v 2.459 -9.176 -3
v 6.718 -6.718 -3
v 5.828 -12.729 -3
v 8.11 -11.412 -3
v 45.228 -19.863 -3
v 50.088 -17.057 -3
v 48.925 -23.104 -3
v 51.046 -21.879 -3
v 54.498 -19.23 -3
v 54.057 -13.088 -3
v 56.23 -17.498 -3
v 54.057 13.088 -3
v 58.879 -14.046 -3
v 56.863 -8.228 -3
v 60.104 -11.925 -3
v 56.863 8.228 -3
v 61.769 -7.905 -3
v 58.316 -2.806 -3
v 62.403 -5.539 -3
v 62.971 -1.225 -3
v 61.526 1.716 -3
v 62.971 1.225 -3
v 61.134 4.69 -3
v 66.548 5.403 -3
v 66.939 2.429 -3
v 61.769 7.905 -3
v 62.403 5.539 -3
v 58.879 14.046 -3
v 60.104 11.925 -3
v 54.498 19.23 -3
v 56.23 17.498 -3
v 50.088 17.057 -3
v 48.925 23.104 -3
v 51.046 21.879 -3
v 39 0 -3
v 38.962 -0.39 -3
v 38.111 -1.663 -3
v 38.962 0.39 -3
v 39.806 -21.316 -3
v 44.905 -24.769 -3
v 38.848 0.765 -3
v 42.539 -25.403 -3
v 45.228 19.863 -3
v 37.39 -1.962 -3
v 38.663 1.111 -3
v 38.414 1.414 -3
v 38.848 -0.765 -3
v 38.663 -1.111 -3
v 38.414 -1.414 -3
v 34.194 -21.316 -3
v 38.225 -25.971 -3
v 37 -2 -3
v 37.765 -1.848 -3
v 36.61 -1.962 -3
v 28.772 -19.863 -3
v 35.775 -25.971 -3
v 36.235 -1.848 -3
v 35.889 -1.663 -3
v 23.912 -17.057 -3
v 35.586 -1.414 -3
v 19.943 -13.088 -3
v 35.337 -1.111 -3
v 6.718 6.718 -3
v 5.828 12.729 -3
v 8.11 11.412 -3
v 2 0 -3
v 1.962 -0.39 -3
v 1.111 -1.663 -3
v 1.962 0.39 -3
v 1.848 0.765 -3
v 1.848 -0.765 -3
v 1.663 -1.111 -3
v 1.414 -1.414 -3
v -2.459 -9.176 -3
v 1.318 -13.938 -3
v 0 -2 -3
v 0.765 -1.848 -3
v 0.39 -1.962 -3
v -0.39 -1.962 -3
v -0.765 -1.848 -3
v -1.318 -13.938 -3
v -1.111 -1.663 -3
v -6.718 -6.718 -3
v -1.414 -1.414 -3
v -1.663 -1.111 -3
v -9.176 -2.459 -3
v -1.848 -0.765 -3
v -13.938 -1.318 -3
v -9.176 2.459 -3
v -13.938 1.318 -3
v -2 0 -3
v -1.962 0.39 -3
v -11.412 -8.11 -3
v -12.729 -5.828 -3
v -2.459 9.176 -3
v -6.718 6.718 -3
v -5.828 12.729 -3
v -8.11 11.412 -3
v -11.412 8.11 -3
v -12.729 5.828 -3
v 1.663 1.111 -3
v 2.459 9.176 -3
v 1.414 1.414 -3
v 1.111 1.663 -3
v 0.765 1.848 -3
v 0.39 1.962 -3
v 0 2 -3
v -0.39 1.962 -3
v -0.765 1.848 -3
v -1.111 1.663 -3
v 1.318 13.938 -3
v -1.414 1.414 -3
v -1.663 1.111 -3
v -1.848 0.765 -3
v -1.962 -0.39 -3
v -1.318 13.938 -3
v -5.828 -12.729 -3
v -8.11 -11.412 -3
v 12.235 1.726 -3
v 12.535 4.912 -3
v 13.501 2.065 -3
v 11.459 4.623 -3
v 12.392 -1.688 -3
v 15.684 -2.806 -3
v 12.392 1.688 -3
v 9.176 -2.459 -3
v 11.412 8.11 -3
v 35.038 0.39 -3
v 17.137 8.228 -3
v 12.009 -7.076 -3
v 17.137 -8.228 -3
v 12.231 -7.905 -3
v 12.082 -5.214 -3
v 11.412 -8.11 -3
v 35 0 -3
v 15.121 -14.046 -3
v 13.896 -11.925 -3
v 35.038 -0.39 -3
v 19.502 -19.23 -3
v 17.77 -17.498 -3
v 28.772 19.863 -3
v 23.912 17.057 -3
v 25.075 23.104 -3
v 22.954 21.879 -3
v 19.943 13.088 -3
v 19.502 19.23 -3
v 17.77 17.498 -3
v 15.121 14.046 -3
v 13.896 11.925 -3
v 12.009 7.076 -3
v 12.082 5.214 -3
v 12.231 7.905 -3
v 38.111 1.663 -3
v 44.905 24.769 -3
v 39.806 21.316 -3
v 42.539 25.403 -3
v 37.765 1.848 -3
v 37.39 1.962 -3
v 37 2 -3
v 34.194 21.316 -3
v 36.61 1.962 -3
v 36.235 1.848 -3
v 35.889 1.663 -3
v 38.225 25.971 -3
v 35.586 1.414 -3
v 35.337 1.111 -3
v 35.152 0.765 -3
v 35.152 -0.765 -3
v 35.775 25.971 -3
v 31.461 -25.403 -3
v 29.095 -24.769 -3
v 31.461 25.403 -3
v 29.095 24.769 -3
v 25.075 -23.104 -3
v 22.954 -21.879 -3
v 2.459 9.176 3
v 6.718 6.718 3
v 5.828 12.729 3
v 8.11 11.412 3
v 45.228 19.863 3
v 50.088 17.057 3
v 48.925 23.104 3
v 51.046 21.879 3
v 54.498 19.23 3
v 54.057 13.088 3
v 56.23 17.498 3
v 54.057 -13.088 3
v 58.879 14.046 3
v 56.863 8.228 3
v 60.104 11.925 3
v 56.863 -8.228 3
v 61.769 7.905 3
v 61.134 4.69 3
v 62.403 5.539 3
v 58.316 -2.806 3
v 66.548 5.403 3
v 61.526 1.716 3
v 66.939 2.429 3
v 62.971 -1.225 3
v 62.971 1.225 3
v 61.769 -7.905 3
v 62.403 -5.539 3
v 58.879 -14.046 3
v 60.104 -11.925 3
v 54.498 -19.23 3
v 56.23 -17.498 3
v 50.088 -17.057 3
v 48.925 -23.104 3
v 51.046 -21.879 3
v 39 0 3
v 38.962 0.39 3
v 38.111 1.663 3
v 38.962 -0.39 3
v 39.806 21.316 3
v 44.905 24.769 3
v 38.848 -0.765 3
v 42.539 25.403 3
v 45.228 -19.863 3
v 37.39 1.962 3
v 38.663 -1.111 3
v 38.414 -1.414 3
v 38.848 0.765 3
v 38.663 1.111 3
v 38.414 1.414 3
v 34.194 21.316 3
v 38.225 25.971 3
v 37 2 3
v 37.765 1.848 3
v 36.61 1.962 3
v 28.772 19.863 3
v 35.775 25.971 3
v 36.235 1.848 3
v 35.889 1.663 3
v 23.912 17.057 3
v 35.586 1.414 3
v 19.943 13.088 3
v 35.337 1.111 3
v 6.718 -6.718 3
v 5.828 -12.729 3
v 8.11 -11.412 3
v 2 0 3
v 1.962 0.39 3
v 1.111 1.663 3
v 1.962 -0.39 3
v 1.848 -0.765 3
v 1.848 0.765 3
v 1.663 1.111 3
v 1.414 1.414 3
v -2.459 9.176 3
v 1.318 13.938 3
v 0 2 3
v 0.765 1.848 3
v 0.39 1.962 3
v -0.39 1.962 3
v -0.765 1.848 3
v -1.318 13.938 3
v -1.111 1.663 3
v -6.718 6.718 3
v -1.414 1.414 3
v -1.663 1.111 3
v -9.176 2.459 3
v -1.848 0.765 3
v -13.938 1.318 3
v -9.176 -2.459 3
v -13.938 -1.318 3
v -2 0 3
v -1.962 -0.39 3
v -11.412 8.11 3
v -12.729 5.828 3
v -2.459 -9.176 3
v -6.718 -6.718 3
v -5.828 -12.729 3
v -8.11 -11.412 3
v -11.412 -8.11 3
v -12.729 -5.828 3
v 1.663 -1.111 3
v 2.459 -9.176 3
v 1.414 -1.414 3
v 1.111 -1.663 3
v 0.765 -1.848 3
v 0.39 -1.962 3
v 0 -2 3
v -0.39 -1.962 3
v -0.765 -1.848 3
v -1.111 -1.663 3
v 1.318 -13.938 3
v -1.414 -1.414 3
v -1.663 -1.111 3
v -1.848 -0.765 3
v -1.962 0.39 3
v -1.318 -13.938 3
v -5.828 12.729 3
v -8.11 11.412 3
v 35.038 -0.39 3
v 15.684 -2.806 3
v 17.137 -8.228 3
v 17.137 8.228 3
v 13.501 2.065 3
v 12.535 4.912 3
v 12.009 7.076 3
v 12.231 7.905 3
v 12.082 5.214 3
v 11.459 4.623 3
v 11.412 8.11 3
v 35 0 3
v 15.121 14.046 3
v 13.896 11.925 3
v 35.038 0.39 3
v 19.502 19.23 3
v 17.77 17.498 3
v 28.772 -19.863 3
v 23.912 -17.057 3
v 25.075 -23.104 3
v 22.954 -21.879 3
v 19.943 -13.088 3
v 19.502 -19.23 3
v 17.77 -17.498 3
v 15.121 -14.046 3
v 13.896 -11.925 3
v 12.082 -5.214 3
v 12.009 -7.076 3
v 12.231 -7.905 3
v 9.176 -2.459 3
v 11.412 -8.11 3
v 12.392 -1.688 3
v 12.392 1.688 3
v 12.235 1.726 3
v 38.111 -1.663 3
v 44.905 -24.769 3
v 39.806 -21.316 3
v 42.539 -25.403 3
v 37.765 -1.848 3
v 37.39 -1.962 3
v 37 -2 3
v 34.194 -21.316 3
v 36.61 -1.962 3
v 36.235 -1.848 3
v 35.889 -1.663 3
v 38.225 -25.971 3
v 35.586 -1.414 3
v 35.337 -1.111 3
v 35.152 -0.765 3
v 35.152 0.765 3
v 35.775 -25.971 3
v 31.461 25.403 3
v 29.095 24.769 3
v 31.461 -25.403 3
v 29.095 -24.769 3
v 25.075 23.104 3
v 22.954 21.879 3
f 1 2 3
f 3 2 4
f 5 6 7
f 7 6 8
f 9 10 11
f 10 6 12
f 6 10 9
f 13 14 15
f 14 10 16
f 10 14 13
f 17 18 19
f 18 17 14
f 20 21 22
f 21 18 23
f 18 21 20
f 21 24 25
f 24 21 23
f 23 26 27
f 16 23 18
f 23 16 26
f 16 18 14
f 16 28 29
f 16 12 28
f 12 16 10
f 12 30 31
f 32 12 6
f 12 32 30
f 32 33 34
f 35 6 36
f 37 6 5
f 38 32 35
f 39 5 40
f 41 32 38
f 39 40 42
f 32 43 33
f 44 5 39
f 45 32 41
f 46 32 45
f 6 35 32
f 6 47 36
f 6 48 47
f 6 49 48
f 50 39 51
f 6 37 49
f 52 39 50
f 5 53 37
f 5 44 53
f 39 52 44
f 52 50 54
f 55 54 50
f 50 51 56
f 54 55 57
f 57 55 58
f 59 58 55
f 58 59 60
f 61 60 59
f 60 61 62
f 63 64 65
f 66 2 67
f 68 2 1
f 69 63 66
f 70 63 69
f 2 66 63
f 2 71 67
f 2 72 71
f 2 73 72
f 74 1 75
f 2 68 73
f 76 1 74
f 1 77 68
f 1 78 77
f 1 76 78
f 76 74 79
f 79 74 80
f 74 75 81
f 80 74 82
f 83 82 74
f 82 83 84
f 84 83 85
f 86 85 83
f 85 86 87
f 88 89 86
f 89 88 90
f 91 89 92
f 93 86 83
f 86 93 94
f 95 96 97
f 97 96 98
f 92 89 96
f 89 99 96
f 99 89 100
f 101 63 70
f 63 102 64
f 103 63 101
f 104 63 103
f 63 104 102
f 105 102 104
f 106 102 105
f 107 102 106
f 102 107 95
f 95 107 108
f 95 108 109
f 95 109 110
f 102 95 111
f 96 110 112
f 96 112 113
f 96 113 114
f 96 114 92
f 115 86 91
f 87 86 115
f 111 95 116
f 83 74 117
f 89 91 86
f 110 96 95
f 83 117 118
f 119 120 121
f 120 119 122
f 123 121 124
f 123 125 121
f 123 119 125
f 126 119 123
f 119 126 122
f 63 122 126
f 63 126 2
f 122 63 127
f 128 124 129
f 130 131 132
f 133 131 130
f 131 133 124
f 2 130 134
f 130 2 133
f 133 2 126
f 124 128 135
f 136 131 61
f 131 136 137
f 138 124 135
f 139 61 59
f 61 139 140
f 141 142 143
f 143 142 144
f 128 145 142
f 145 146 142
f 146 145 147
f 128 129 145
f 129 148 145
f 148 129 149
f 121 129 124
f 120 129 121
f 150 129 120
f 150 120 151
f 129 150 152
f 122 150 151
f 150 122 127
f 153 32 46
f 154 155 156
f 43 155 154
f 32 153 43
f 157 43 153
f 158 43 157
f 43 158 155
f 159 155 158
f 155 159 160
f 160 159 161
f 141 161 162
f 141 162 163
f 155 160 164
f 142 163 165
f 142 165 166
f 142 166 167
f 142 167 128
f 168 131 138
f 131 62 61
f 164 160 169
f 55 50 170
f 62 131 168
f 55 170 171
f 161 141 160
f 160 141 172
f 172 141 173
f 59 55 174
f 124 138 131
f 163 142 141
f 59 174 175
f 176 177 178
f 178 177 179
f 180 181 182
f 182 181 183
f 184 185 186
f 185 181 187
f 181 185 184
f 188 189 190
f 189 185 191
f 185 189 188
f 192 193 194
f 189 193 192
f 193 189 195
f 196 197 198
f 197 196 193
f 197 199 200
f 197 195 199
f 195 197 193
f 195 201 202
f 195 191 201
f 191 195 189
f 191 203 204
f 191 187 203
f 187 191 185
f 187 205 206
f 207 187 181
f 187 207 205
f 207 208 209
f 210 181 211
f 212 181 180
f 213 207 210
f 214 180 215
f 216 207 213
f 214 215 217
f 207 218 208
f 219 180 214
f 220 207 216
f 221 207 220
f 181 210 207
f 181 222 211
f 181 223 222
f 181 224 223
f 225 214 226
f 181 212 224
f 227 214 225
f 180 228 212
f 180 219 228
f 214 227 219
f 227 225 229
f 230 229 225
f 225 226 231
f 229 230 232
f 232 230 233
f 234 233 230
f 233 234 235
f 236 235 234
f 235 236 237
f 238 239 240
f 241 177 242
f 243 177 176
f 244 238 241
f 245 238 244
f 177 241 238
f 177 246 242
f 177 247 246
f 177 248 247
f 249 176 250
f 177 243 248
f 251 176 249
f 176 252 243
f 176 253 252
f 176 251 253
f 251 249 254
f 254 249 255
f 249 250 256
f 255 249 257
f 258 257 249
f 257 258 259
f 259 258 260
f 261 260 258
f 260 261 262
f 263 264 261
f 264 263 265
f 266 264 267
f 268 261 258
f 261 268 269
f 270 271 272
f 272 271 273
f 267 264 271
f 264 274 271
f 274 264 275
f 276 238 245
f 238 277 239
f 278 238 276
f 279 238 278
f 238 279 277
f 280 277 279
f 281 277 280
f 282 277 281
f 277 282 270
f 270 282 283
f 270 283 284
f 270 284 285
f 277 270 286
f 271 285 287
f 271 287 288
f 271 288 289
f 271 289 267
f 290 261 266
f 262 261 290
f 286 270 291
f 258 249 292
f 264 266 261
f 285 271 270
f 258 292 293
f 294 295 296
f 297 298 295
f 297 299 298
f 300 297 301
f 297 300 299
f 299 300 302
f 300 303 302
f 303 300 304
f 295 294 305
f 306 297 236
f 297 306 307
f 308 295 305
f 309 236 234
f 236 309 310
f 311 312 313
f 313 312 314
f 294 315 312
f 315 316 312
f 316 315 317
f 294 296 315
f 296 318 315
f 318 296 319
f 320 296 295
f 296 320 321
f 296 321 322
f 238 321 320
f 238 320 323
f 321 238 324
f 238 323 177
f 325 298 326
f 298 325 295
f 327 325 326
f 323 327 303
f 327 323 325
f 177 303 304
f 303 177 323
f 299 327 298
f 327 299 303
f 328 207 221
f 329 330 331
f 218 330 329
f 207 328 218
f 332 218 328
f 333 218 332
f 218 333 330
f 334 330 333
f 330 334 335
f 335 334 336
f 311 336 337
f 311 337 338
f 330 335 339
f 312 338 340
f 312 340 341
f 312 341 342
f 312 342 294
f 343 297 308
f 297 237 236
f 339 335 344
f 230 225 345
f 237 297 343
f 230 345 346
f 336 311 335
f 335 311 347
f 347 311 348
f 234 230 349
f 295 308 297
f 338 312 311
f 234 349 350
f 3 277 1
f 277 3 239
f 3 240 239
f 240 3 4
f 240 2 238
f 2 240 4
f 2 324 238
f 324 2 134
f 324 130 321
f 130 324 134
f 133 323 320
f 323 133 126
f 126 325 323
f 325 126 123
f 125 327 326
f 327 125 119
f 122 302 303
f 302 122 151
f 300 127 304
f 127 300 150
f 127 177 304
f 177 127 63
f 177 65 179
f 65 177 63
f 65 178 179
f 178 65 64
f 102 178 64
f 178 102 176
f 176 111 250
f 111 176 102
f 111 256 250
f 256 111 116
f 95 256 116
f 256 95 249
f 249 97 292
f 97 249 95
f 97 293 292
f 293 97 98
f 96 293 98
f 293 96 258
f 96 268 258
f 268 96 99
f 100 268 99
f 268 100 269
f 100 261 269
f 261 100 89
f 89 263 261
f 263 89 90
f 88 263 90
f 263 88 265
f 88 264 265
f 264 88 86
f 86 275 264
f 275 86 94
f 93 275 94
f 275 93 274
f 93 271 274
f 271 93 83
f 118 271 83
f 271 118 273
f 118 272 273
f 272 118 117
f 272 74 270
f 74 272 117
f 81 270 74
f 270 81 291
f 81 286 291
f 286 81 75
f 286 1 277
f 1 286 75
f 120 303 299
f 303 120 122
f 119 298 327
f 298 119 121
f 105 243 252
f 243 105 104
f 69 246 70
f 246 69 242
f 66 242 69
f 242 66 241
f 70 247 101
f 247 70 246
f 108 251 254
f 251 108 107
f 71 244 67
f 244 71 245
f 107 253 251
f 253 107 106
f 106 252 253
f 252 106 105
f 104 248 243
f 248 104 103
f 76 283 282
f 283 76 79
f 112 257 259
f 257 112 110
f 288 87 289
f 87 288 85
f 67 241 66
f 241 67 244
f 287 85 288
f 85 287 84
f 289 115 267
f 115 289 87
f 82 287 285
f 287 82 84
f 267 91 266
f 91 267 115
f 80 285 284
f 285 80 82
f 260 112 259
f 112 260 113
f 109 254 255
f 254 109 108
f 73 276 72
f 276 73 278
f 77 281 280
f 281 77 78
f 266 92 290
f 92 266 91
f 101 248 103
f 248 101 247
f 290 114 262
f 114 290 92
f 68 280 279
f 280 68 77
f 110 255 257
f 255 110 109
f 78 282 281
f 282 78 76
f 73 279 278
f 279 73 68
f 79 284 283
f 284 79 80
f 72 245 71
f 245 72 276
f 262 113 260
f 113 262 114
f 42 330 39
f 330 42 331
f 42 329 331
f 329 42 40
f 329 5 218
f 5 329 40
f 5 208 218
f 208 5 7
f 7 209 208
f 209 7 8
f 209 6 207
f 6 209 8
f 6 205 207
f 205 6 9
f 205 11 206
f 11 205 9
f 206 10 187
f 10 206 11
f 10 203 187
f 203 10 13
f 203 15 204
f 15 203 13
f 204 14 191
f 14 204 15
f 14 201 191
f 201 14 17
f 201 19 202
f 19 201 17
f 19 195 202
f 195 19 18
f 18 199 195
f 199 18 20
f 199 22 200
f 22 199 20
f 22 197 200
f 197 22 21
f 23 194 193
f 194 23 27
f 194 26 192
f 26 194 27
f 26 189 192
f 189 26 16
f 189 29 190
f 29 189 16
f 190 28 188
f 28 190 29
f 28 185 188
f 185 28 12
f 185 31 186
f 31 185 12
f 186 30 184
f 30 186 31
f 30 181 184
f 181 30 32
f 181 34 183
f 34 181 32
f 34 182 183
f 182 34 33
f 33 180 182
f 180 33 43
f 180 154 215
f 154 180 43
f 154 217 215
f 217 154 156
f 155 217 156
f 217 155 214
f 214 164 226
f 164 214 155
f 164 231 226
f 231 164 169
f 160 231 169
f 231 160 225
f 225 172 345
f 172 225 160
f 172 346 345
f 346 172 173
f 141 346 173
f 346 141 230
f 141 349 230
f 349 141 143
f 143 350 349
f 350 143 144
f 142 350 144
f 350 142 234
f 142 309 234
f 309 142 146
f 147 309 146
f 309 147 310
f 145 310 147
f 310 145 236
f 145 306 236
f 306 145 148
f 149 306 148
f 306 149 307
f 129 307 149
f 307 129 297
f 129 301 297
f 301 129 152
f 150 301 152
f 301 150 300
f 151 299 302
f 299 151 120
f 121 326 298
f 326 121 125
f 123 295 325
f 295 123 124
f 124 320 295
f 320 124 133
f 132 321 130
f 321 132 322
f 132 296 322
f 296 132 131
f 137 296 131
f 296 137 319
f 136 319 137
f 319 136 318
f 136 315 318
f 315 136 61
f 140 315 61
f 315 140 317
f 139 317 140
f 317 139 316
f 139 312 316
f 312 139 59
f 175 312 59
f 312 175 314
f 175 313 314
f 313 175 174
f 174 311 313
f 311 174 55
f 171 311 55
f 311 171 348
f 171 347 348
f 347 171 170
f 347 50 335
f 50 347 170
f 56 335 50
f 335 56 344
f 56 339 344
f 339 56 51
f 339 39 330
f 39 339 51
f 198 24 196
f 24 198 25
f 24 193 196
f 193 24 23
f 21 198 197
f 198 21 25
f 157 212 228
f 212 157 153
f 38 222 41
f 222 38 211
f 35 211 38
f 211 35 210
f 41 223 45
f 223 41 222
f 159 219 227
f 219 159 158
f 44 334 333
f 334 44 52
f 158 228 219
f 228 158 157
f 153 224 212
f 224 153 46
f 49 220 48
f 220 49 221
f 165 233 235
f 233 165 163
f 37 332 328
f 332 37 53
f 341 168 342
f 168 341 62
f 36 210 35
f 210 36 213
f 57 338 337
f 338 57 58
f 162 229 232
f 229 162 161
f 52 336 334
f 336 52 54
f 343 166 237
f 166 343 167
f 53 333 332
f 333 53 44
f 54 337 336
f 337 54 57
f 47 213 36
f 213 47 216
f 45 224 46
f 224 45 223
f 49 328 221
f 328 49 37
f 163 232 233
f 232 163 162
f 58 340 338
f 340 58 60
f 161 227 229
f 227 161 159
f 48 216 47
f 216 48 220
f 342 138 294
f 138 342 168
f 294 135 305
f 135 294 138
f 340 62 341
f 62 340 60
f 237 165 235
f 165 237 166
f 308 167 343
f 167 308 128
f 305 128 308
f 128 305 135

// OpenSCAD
// Original external spur-gear pair fixture, millimetres.
// Two gears with a radial index tab; the tab is a measurement feature, not a
// claim about tooth contact, backlash, strength or manufacturing tolerance.
agentscad_part = "all";
agentscad_pose = false;
input_deg = 0;
ratio_sign = -1;

module_mm = 2;
pinion_teeth = 12;
wheel_teeth = 24;
thickness = 6;
center_distance = module_mm * (pinion_teeth + wheel_teeth) / 2;
pinion_pitch = module_mm * pinion_teeth / 2;
wheel_pitch = module_mm * wheel_teeth / 2;
addendum = module_mm;
dedendum = 1.25 * module_mm;
marker_min_r_mm = 0;
marker_max_r_mm = 0;

wheel_angle_deg = ratio_sign * input_deg * pinion_teeth / wheel_teeth;

module gear_outline(teeth, pitch_radius) {
  tip_radius = pitch_radius + addendum;
  root_radius = pitch_radius - dedendum;
  half_pitch_deg = 180 / teeth;
  tip_half_deg = 0.18 * 360 / teeth;
  points = [
    for (i = [0 : teeth - 1], k = [0 : 2])
      let (a = i * 360 / teeth + (k == 0 ? -half_pitch_deg : (k == 1 ? -tip_half_deg : tip_half_deg)),
           r = k == 0 ? root_radius : tip_radius)
      [r * cos(a), r * sin(a)]
  ];
  linear_extrude(height = thickness, center = true, convexity = 10)
    polygon(points = points);
}

module gear_body(teeth, pitch_radius) {
  root_r = pitch_radius - dedendum;
  tip_r = pitch_radius + addendum;
  // Radial index tab in a root gap (half a tooth pitch from the first tooth).
  // Its outer vertices are the only measurement feature outside the addendum.
  marker_angle = 180 / teeth;
  marker_outer_r = tip_r + 4;
  marker_inner_r = root_r - 0.5;
  difference() {
    union() {
      gear_outline(teeth, pitch_radius);
      rotate([0, 0, marker_angle])
        translate([(marker_inner_r + marker_outer_r) / 2, 0, 0])
          cube([marker_outer_r - marker_inner_r, 3, thickness], center = true);
    }
    cylinder(h = thickness + 2, r = 2, center = true, $fn = 32);
  }
}

module pinion_local() { gear_body(pinion_teeth, pinion_pitch); }
module wheel_local() { gear_body(wheel_teeth, wheel_pitch); }

module generated_part() {
  if (agentscad_part == "pinion") {
    pinion_local();
  } else if (agentscad_part == "wheel") {
    wheel_local();
  } else if (agentscad_part == "pinion_pose") {
    rotate([0, 0, input_deg]) pinion_local();
  } else if (agentscad_part == "wheel_pose") {
    translate([center_distance + 1, 0, 0])
      rotate([0, 0, wheel_angle_deg]) wheel_local();
  } else {
    rotate([0, 0, input_deg]) pinion_local();
    translate([center_distance + 1, 0, 0])
      rotate([0, 0, wheel_angle_deg]) wheel_local();
  }
}

generated_part();
